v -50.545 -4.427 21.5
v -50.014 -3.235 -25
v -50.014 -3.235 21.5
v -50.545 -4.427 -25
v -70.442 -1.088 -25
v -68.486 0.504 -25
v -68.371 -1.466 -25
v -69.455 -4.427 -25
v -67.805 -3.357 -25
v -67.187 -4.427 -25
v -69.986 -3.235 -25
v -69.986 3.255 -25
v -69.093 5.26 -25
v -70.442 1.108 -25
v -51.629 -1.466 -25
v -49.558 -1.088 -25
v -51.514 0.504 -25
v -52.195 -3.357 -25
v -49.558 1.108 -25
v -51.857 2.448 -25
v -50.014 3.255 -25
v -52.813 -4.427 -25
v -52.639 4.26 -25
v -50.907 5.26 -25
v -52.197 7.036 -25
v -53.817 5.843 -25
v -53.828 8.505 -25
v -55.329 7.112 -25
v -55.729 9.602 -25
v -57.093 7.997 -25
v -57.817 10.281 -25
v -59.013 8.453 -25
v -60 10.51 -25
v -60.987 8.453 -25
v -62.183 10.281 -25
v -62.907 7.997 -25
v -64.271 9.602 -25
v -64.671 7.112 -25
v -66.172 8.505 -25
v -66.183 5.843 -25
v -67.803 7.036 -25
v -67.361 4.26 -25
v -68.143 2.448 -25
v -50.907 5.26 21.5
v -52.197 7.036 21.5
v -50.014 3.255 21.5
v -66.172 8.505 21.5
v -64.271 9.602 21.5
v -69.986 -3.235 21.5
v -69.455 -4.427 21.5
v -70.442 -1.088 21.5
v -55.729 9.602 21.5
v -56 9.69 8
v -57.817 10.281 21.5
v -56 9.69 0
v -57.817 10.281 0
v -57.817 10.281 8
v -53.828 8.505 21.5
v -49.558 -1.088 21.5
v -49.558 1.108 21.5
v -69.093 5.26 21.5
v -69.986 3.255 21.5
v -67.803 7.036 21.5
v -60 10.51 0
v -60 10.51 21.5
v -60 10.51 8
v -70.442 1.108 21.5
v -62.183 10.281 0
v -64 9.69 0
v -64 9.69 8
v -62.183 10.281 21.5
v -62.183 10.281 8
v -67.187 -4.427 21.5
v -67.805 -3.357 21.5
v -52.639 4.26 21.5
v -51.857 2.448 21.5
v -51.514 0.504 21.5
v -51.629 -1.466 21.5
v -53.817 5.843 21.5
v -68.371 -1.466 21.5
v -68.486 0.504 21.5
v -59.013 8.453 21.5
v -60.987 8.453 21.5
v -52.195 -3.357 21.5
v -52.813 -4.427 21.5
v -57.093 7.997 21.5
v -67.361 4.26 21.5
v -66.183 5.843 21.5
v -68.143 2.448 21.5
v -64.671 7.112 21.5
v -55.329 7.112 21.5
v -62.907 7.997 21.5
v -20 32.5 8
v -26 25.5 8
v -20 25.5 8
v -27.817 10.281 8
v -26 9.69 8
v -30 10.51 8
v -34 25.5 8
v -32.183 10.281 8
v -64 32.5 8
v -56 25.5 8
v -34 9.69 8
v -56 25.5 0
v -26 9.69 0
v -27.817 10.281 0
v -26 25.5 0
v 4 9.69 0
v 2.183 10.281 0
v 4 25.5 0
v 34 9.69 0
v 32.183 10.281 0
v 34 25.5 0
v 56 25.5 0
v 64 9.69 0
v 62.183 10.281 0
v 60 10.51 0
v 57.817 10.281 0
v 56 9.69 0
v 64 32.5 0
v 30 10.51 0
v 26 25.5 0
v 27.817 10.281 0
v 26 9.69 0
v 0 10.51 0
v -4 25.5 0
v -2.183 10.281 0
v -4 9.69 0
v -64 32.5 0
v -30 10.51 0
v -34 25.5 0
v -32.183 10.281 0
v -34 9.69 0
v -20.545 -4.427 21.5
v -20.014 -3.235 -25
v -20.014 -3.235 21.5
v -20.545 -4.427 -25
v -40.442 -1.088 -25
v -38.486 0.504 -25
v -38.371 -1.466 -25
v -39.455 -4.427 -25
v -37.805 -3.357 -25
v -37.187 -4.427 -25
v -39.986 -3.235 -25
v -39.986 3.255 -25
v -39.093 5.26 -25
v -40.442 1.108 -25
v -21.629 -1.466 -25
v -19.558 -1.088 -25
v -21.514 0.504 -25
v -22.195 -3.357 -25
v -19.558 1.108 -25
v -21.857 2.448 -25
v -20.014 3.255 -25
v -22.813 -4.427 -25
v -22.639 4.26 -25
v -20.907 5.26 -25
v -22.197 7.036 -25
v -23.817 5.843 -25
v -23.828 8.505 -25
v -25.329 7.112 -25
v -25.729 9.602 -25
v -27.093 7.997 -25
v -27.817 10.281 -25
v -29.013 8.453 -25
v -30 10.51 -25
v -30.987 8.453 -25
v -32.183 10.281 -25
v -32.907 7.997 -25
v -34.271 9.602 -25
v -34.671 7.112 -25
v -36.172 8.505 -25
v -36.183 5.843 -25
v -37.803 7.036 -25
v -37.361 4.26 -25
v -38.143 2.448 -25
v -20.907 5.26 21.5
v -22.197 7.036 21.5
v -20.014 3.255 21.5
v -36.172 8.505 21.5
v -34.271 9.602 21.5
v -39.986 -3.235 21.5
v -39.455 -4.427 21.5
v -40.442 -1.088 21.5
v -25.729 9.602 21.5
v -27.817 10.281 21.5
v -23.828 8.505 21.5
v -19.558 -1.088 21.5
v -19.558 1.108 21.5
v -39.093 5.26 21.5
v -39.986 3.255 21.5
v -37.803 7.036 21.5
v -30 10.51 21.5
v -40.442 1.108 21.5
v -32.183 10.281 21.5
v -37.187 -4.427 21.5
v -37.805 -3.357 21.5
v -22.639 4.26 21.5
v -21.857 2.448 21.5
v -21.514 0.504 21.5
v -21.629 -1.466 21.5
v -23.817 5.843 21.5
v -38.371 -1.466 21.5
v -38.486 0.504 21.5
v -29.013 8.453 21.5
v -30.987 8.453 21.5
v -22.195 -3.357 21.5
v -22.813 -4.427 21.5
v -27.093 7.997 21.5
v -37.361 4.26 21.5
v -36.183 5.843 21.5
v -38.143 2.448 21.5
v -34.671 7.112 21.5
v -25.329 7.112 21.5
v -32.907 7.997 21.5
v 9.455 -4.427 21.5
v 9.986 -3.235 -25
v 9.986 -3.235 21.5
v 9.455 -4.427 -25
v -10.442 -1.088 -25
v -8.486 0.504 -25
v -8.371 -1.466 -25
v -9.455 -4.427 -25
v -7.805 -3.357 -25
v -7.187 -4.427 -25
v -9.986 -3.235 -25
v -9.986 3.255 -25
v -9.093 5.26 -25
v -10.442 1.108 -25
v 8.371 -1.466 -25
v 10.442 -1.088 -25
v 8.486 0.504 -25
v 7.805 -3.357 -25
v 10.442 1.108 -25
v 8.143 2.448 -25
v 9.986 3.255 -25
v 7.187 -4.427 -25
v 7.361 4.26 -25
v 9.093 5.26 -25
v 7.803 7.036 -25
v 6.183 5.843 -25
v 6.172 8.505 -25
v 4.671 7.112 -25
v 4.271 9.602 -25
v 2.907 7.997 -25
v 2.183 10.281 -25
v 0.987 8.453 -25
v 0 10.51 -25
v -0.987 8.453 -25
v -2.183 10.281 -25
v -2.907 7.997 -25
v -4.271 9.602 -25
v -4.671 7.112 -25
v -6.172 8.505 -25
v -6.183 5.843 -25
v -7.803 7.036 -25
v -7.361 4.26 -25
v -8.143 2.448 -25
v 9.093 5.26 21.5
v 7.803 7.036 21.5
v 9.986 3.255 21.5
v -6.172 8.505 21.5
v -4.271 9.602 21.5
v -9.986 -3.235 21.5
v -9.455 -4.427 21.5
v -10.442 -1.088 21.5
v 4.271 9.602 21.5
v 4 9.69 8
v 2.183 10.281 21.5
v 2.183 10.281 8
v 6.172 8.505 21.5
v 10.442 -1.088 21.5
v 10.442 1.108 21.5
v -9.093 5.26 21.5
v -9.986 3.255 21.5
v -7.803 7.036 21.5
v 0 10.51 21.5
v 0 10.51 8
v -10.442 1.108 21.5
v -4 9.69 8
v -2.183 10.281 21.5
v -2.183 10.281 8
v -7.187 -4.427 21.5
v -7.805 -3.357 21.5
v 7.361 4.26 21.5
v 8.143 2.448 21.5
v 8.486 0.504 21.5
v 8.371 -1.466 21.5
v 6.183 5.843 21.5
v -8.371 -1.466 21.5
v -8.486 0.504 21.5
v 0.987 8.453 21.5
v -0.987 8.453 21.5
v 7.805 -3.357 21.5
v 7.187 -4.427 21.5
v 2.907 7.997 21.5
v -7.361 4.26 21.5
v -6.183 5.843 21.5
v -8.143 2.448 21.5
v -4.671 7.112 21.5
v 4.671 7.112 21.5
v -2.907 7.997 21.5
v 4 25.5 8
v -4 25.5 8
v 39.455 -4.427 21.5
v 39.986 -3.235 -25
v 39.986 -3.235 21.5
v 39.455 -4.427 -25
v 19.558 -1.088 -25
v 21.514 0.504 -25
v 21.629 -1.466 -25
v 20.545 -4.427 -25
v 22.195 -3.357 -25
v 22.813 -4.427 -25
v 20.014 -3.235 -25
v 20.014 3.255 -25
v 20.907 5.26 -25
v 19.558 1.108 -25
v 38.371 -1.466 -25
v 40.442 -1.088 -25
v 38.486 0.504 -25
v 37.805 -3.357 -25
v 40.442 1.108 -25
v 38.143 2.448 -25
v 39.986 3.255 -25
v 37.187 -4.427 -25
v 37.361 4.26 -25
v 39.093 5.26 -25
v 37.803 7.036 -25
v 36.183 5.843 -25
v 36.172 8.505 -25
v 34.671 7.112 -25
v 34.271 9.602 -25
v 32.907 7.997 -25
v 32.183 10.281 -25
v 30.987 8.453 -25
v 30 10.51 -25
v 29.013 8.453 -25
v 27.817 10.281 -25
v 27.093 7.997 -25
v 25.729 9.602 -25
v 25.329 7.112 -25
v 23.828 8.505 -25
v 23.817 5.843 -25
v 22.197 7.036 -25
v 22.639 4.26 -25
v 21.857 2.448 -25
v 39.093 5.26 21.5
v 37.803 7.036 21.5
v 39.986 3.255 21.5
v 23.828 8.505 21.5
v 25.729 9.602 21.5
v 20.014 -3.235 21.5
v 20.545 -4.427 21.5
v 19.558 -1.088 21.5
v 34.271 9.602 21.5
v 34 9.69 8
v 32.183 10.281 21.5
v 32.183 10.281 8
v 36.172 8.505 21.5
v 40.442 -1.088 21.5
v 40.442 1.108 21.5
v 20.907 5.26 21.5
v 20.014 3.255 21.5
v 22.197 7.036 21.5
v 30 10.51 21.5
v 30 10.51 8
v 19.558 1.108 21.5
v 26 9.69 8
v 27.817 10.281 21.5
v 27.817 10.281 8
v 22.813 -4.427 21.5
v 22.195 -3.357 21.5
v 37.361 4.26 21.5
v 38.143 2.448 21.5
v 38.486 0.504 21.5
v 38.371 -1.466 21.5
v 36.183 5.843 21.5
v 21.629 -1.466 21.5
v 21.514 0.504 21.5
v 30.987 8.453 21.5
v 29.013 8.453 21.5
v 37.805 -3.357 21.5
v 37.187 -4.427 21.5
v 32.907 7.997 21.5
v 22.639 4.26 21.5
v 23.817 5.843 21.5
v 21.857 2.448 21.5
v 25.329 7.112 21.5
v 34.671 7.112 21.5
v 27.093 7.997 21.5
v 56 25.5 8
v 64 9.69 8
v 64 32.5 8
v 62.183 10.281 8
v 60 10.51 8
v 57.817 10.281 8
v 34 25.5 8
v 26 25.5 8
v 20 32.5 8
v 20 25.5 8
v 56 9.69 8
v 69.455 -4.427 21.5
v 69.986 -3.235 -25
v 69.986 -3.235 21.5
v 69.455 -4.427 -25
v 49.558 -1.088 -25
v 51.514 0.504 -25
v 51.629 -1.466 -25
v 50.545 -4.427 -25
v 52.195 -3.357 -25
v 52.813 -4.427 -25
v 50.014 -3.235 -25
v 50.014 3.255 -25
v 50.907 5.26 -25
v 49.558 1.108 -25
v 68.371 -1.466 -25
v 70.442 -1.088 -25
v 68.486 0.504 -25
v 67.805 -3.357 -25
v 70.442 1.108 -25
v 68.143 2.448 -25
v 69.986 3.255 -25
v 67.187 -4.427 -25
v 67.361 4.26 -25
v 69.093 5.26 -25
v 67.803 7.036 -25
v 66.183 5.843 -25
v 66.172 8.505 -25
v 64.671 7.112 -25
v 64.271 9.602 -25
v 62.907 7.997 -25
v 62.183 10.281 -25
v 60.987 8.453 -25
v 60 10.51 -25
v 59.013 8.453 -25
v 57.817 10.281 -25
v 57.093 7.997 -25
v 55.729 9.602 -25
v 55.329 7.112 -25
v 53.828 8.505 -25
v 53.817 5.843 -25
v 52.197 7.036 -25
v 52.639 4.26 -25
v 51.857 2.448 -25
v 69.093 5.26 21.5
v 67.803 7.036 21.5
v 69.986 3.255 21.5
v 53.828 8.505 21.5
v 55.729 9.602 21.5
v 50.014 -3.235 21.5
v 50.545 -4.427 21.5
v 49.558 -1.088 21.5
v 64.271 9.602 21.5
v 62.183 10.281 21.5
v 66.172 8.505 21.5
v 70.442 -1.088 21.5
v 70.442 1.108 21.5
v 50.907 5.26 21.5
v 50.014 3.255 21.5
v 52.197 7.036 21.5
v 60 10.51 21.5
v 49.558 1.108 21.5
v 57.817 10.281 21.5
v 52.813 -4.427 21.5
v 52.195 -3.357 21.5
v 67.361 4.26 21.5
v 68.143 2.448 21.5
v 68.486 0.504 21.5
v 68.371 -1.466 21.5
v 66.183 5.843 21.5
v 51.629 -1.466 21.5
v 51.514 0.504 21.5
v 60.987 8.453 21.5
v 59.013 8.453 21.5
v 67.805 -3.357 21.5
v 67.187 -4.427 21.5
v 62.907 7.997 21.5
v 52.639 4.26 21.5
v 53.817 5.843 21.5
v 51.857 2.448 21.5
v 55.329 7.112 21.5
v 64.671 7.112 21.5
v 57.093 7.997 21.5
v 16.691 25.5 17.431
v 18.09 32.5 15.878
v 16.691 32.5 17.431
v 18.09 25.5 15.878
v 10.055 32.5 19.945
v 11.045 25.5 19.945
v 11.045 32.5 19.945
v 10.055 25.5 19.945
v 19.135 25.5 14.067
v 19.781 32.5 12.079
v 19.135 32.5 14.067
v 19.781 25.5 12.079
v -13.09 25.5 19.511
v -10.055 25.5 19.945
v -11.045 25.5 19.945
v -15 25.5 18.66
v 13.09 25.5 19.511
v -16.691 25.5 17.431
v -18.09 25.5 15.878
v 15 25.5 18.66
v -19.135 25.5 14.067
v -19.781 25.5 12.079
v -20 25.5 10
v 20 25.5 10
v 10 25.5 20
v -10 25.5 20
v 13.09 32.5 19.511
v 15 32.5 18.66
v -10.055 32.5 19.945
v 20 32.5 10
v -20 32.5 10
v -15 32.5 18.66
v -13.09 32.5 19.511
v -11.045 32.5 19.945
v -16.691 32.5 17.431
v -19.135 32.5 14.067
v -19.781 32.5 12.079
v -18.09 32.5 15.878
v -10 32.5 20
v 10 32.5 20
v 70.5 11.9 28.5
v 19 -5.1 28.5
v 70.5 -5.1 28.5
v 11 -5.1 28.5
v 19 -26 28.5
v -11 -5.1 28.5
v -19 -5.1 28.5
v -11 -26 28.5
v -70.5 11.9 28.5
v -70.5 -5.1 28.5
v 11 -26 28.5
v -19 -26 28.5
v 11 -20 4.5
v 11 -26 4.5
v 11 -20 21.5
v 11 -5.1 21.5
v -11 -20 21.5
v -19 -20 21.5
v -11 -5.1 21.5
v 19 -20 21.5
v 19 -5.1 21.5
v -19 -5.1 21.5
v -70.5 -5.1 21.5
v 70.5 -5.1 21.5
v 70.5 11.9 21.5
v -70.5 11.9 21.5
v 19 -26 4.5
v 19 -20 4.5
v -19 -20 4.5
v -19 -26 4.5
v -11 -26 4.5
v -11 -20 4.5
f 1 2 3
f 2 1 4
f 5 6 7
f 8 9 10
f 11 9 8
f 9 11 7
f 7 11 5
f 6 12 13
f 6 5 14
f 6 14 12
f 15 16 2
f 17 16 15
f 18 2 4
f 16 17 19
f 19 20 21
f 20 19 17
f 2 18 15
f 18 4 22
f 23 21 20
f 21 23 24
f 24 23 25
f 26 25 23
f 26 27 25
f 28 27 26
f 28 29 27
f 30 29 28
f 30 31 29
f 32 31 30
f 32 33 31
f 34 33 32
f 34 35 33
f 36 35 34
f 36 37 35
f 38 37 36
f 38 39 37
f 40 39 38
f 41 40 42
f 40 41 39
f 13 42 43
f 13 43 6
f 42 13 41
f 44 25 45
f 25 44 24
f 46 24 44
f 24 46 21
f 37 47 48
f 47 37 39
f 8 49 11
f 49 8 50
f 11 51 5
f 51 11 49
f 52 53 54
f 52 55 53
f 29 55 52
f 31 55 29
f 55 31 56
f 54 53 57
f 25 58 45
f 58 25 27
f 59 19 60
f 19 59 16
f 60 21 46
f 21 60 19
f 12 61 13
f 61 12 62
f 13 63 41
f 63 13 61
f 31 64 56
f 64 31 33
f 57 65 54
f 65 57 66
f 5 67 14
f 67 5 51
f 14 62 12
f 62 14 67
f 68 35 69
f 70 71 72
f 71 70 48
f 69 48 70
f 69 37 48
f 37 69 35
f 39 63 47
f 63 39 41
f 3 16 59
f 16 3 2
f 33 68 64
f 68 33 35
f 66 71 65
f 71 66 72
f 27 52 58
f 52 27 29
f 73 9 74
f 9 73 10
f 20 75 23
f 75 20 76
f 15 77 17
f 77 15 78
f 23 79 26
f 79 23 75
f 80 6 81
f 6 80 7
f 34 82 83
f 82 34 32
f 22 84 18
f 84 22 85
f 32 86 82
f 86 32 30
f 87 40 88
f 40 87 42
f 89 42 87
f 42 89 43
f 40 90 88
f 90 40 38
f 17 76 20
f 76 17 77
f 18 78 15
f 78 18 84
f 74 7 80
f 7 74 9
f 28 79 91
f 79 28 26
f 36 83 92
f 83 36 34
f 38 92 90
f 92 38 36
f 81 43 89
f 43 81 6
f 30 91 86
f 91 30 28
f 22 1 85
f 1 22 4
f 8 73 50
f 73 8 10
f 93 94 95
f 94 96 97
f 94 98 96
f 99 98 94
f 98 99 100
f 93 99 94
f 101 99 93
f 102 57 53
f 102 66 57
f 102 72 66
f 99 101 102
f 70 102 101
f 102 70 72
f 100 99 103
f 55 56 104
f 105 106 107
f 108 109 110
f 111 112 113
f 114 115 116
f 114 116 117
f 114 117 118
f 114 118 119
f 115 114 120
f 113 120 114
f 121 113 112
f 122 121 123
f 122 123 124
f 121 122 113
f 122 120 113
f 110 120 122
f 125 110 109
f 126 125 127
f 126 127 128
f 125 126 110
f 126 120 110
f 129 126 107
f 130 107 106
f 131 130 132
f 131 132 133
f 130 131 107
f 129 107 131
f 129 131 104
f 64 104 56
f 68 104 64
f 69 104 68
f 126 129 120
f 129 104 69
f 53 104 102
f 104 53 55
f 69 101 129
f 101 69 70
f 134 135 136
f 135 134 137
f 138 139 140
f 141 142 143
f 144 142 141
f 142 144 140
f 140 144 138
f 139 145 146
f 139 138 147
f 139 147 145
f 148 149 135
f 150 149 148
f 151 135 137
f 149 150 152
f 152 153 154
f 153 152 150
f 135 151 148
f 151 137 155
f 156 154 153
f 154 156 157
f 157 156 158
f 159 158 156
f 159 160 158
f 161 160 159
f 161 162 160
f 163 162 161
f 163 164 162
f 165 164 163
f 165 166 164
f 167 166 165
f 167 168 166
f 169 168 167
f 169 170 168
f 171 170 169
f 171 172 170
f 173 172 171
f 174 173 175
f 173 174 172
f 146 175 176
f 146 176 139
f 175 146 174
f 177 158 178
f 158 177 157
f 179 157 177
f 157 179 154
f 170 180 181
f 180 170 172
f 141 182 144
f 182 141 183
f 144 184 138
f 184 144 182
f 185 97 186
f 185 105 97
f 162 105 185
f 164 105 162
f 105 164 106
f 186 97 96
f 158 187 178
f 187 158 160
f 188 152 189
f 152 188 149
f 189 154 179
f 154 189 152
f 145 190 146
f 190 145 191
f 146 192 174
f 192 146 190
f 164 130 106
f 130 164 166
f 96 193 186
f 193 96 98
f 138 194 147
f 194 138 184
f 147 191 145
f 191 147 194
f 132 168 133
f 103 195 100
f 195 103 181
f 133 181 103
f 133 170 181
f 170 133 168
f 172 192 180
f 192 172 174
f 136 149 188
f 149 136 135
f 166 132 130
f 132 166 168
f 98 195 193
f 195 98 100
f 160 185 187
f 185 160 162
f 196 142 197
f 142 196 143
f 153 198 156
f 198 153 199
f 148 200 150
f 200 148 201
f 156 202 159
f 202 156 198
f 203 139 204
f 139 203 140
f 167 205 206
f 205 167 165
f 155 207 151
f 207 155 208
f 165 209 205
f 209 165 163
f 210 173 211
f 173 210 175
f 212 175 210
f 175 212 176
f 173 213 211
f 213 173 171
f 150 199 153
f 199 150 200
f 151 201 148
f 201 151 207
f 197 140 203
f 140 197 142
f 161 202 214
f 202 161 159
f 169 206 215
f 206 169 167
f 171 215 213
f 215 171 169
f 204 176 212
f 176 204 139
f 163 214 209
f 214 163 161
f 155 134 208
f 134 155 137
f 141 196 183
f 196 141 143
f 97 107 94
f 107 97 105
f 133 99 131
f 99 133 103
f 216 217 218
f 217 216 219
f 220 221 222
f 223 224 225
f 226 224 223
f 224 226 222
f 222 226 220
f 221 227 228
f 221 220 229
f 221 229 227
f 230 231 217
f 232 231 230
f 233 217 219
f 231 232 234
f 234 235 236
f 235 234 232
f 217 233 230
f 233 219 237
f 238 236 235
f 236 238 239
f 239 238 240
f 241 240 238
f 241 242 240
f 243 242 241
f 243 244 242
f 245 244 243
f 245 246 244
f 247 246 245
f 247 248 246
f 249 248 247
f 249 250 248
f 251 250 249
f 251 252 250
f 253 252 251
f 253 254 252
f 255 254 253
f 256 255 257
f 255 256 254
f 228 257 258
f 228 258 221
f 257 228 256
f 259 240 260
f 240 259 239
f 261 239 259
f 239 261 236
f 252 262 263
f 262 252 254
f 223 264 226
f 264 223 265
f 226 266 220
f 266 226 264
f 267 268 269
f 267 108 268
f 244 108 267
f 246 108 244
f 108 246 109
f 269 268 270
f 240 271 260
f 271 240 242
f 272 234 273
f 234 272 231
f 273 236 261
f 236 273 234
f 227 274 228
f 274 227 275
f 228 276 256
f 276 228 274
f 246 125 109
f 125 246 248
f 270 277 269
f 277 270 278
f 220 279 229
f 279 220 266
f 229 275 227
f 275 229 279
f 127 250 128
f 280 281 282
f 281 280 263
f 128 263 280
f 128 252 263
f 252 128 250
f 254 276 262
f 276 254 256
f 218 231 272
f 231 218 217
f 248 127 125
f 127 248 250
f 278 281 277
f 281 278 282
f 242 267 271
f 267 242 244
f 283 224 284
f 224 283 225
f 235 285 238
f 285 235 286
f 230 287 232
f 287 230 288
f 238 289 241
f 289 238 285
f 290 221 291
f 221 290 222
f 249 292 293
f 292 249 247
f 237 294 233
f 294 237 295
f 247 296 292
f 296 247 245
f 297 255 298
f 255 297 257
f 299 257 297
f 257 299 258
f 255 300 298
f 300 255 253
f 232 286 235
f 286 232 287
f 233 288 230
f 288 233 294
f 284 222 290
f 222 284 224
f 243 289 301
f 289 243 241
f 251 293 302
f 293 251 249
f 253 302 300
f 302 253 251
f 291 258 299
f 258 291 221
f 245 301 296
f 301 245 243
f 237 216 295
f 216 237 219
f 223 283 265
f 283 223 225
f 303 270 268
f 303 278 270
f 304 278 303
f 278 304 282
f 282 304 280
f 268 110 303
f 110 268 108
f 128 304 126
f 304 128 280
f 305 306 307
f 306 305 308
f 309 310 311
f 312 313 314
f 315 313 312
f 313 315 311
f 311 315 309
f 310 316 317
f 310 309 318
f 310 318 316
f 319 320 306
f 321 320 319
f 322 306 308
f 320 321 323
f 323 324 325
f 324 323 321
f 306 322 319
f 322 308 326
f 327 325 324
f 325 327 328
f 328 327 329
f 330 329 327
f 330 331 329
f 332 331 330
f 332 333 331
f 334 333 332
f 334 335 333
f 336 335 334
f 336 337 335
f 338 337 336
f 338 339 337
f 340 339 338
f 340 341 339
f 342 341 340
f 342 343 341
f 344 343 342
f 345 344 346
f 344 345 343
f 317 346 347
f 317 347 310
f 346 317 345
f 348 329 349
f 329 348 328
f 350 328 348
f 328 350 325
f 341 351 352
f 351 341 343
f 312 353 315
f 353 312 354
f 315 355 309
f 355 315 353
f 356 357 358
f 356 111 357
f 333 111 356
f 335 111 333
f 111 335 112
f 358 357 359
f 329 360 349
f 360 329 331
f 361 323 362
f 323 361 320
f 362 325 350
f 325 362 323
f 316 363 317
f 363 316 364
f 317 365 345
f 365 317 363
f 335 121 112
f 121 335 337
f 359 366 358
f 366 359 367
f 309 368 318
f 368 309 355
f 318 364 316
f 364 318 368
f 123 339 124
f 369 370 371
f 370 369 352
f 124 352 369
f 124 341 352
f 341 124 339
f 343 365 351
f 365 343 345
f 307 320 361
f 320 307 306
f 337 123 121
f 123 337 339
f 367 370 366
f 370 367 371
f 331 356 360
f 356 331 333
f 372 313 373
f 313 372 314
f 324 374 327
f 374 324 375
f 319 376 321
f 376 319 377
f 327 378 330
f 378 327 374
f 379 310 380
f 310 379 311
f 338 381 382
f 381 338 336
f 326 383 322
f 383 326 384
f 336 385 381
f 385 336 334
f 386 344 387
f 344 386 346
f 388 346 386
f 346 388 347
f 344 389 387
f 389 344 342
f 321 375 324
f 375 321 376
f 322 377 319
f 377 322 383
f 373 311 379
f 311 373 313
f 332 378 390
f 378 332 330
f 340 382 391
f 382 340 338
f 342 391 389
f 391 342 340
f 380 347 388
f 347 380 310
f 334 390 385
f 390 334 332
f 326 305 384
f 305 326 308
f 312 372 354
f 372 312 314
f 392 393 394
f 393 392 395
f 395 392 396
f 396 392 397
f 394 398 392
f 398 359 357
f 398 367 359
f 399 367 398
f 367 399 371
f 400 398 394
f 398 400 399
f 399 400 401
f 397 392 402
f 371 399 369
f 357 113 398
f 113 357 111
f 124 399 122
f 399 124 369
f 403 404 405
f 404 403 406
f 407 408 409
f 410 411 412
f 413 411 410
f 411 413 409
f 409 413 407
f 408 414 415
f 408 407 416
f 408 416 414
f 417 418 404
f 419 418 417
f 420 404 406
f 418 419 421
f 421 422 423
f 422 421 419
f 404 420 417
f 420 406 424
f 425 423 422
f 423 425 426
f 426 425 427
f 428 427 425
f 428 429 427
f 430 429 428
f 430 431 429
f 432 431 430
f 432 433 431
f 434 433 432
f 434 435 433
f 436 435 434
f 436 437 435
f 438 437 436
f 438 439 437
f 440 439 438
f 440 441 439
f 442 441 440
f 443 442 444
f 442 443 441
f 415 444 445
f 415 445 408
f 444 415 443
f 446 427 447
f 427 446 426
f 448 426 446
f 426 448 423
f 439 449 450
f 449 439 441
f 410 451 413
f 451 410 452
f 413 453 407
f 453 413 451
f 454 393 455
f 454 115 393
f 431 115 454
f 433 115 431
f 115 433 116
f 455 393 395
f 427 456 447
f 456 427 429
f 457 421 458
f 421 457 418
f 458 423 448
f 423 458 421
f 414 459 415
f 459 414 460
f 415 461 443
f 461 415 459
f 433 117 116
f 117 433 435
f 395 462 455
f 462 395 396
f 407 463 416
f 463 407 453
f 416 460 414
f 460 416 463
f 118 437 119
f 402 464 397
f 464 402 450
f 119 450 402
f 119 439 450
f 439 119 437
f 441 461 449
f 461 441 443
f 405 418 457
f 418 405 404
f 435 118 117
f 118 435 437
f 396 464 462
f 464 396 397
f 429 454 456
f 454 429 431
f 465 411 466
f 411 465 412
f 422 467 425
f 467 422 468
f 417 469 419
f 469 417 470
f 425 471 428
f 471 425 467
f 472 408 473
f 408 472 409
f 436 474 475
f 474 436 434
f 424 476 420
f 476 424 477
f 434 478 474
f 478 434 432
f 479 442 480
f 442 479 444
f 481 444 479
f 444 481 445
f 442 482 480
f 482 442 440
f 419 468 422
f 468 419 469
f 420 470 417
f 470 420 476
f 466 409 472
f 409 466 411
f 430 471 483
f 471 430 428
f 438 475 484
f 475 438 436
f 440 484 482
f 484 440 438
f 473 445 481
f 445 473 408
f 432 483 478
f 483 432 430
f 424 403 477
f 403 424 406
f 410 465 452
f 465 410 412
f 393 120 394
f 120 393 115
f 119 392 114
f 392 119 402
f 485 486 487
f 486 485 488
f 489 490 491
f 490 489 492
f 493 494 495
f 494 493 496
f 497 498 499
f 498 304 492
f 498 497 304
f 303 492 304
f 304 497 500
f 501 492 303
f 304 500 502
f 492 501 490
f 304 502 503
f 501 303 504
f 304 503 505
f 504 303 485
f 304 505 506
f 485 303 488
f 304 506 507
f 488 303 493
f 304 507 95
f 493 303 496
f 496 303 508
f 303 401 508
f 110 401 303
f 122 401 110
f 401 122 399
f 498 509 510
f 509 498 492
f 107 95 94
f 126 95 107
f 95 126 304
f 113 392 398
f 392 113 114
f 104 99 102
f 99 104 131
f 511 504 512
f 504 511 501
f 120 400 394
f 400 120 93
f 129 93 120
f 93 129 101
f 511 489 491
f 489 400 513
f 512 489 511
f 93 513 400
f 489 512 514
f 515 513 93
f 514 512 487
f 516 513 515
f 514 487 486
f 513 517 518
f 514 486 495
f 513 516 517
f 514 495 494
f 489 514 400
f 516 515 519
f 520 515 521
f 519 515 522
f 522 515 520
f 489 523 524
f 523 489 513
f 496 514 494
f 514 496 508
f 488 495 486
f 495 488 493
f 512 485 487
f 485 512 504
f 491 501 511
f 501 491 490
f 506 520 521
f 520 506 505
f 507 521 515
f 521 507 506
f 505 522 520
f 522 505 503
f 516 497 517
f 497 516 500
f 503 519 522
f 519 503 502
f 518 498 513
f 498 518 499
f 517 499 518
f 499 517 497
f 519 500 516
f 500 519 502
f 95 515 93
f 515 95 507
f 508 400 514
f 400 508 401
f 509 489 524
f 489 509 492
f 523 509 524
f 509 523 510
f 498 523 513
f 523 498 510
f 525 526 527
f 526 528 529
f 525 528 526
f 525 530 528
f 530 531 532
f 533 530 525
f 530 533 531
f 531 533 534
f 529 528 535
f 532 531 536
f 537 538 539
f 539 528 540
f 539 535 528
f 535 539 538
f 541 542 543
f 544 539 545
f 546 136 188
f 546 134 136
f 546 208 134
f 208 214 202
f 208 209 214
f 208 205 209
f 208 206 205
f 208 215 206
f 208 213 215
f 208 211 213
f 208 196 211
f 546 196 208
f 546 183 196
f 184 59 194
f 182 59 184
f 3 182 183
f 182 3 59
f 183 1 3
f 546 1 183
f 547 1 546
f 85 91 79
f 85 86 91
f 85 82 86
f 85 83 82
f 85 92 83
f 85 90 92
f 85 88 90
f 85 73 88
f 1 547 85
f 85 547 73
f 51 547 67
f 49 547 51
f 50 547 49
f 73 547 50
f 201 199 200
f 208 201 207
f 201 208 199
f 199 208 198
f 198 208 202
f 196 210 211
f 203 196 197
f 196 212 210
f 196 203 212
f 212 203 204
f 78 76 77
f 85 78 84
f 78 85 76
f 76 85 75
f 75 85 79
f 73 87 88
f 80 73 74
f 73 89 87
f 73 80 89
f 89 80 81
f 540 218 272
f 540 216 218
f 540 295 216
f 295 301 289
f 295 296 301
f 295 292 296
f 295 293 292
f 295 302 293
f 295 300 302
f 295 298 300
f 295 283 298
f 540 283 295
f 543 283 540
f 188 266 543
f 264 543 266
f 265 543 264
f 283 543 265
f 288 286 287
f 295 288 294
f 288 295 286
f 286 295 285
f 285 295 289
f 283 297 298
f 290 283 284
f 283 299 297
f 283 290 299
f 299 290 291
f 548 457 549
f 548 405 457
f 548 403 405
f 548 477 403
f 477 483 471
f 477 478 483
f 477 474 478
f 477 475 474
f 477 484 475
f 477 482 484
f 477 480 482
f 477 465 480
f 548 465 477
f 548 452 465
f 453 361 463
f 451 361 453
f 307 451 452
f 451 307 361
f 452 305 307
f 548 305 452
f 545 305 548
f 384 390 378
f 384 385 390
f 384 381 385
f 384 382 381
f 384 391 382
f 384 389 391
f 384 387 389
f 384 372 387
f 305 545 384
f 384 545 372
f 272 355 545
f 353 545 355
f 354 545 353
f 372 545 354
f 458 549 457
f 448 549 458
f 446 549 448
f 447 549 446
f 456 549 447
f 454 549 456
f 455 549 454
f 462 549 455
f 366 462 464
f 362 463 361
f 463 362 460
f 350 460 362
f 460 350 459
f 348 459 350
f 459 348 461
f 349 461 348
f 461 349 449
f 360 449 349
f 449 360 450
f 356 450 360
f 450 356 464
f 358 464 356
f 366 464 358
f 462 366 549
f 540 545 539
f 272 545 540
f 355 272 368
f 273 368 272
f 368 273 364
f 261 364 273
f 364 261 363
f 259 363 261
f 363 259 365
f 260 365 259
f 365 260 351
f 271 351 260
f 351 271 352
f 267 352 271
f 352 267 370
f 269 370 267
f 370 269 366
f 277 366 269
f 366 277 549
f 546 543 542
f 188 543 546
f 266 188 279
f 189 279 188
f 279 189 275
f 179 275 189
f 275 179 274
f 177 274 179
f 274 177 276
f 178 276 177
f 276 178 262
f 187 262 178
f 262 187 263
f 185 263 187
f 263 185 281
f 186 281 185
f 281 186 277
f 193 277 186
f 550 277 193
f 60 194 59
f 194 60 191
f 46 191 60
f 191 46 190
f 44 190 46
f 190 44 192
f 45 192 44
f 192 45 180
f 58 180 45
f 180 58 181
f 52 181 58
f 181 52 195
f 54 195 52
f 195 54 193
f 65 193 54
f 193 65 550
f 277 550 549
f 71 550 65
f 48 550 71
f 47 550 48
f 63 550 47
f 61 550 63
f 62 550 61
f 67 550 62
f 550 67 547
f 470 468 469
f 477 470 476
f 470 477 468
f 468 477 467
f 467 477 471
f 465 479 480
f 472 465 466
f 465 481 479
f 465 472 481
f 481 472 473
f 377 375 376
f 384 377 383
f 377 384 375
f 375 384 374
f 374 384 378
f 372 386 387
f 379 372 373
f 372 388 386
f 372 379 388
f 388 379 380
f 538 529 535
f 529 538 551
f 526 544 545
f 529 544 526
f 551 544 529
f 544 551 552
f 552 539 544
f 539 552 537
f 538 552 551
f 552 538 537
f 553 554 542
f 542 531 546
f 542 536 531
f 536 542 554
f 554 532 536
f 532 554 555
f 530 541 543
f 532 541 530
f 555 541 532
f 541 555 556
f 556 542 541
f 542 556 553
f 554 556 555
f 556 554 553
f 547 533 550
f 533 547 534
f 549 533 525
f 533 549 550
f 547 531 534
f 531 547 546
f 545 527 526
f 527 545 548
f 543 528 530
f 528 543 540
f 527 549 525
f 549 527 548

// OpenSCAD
/*
 * Parallel Line Jig
 *
 * by Alex Franke (CodeCreations), Oct 2012
 * http://www.theFrankes.com
 * 
 * Licenced under Creative Commons Attribution - Non-Commercial - Share Alike 3.0 
 * 
 * INSTRUCTIONS: Choose some values in the "User-defined values" section, render, and print.
 *   It works well to hold the jig between your thumb and index finger as you pull it across 
 *   the drawing surface.  
 * 
 * THING: http://www.thingiverse.com/thing:31061
 * 
 * v1.00, Oct 3, 2012: Initial release. 
 *
 * TODO: 
 *   * Include keyholes for hanging 
 */

/////////////////////////////////////////////////////////////////////////////
// User-defined values... 
/////////////////////////////////////////////////////////////////////////////
numberOfLines   = 5;    // Total number of pen holders
distanceApart   = 30;   // The distance between parallel lines

penDiameter     = 17;   // The diameter of the writing implement
clampHeight     = 50;    // The height of the writing implement grips  
clampThickness  = 2;    // The thickness of the material that grips the writing implement
gripLength      = 2.5;  // The distance the grips wrap around the writing implements

frameThickness  = 8;    // The thickness of the bars that attach the grips to the handle
frameLength     = 15;   // The distance the grips extend from the handle

handleHeight    = 20;   // The height of the handle
handleThickness = 7;    // The thickness of the handle
handleLength    = 40;   // The length of the handle
handleRadius    = 10;   // The radius of the curve on the upper corners of the handle

rotation        = 0;    // The amount the entire piece will be rotated on the print bed. 



endBarThickness = 7;
hookLength = 22;
hookWidth = 8;
hookPosition = distanceApart/2;
hookVerticalPartThickness = 10;

/////////////////////////////////////////////////////////////////////////////
// The code... 
/////////////////////////////////////////////////////////////////////////////

rotate([0,0,-90+rotation]) 
union() {

	clamps(); 
	
	translate([-penDiameter/2-clampThickness-frameLength,0,0]) 
		rotate([90,0,-90]) 
			handle();
    
    endBar();
    
    coupleOfHangingHooks();
}

module handle() {
	union() {
		translate([-handleLength/2,0,0]) 
			linear_extrude(height=handleThickness)
				polygon(points=[
					[0,0],
					[0,handleHeight-handleRadius],
					[handleRadius,handleHeight],
					[handleLength-handleRadius,handleHeight],
					[handleLength,handleHeight-handleRadius],
					[handleLength,0]
					]);

		for( i=[-1,1] ) {
			translate([(handleLength/2 - handleRadius)*i,handleHeight-handleRadius,0]) 
				difference() {
					cylinder(h=handleThickness, r=handleRadius);
					translate([0,-handleRadius/2,handleThickness/2]) 
						cube([handleRadius*2,handleRadius,handleThickness+1], center=true);
				}
		}

		translate([0,frameThickness/2,handleThickness/2]) 
		cube([distanceApart*(numberOfLines-1)+frameThickness,frameThickness,handleThickness], center=true);
	}
}

module clamps() {
	translate([-0.01, -((numberOfLines-1)*distanceApart)/2,0]) 
	for( i=[0:numberOfLines-1] ) {
		translate([0,distanceApart*i,0]) {
			union() {
				translate([0,0,0]) 
					rodClamp(penDiameter, clampThickness, clampHeight, penDiameter-gripLength);
				translate([-(frameLength+clampThickness+penDiameter)/2,0,frameThickness/2]) 
					cube([frameLength+clampThickness, frameThickness, frameThickness], center=true);
			}
		}
	}
}

// Taken from my SnapConnectors project
module rodClamp(rodDiameter=8, thickness=2, length=8, opening=6) {
	dist = sqrt( pow(rodDiameter/2,2) - pow(opening/2,2) );
	difference() {
		cylinder(h=length, r=rodDiameter/2 + thickness, center=true);
		cylinder(h=length+1, r=rodDiameter/2, center=true);
		translate([dist + (rodDiameter/2 + thickness +1)/2,0,0]) 
			cube([rodDiameter/2 + thickness +1,rodDiameter + thickness*2 +1,length+1], center=true);
	}
}



module endBar()
{
    rotate (90,0,0)
        translate ([0,penDiameter/5,clampHeight/2])
            cube([penDiameter*numberOfLines+(distanceApart-penDiameter)*(numberOfLines-1)+2*(clampThickness), penDiameter, endBarThickness], center=true);
}


module hangingHook(multiplier)
{
    translate ([penDiameter-2,hookPosition*multiplier,penDiameter/2+hookWidth*2+0.5])
		rotate ([0,0,90])
			cube([hookWidth,hookLength,7], center=true);
	
	translate ([hookLength+1,hookPosition*multiplier,penDiameter/2+hookWidth])
		rotate ([0,0,90])
			cube ([hookWidth,6,24], center=true);
}

module coupleOfHangingHooks()
{
	hangingHook(1);
	
	hangingHook(-1);
}
